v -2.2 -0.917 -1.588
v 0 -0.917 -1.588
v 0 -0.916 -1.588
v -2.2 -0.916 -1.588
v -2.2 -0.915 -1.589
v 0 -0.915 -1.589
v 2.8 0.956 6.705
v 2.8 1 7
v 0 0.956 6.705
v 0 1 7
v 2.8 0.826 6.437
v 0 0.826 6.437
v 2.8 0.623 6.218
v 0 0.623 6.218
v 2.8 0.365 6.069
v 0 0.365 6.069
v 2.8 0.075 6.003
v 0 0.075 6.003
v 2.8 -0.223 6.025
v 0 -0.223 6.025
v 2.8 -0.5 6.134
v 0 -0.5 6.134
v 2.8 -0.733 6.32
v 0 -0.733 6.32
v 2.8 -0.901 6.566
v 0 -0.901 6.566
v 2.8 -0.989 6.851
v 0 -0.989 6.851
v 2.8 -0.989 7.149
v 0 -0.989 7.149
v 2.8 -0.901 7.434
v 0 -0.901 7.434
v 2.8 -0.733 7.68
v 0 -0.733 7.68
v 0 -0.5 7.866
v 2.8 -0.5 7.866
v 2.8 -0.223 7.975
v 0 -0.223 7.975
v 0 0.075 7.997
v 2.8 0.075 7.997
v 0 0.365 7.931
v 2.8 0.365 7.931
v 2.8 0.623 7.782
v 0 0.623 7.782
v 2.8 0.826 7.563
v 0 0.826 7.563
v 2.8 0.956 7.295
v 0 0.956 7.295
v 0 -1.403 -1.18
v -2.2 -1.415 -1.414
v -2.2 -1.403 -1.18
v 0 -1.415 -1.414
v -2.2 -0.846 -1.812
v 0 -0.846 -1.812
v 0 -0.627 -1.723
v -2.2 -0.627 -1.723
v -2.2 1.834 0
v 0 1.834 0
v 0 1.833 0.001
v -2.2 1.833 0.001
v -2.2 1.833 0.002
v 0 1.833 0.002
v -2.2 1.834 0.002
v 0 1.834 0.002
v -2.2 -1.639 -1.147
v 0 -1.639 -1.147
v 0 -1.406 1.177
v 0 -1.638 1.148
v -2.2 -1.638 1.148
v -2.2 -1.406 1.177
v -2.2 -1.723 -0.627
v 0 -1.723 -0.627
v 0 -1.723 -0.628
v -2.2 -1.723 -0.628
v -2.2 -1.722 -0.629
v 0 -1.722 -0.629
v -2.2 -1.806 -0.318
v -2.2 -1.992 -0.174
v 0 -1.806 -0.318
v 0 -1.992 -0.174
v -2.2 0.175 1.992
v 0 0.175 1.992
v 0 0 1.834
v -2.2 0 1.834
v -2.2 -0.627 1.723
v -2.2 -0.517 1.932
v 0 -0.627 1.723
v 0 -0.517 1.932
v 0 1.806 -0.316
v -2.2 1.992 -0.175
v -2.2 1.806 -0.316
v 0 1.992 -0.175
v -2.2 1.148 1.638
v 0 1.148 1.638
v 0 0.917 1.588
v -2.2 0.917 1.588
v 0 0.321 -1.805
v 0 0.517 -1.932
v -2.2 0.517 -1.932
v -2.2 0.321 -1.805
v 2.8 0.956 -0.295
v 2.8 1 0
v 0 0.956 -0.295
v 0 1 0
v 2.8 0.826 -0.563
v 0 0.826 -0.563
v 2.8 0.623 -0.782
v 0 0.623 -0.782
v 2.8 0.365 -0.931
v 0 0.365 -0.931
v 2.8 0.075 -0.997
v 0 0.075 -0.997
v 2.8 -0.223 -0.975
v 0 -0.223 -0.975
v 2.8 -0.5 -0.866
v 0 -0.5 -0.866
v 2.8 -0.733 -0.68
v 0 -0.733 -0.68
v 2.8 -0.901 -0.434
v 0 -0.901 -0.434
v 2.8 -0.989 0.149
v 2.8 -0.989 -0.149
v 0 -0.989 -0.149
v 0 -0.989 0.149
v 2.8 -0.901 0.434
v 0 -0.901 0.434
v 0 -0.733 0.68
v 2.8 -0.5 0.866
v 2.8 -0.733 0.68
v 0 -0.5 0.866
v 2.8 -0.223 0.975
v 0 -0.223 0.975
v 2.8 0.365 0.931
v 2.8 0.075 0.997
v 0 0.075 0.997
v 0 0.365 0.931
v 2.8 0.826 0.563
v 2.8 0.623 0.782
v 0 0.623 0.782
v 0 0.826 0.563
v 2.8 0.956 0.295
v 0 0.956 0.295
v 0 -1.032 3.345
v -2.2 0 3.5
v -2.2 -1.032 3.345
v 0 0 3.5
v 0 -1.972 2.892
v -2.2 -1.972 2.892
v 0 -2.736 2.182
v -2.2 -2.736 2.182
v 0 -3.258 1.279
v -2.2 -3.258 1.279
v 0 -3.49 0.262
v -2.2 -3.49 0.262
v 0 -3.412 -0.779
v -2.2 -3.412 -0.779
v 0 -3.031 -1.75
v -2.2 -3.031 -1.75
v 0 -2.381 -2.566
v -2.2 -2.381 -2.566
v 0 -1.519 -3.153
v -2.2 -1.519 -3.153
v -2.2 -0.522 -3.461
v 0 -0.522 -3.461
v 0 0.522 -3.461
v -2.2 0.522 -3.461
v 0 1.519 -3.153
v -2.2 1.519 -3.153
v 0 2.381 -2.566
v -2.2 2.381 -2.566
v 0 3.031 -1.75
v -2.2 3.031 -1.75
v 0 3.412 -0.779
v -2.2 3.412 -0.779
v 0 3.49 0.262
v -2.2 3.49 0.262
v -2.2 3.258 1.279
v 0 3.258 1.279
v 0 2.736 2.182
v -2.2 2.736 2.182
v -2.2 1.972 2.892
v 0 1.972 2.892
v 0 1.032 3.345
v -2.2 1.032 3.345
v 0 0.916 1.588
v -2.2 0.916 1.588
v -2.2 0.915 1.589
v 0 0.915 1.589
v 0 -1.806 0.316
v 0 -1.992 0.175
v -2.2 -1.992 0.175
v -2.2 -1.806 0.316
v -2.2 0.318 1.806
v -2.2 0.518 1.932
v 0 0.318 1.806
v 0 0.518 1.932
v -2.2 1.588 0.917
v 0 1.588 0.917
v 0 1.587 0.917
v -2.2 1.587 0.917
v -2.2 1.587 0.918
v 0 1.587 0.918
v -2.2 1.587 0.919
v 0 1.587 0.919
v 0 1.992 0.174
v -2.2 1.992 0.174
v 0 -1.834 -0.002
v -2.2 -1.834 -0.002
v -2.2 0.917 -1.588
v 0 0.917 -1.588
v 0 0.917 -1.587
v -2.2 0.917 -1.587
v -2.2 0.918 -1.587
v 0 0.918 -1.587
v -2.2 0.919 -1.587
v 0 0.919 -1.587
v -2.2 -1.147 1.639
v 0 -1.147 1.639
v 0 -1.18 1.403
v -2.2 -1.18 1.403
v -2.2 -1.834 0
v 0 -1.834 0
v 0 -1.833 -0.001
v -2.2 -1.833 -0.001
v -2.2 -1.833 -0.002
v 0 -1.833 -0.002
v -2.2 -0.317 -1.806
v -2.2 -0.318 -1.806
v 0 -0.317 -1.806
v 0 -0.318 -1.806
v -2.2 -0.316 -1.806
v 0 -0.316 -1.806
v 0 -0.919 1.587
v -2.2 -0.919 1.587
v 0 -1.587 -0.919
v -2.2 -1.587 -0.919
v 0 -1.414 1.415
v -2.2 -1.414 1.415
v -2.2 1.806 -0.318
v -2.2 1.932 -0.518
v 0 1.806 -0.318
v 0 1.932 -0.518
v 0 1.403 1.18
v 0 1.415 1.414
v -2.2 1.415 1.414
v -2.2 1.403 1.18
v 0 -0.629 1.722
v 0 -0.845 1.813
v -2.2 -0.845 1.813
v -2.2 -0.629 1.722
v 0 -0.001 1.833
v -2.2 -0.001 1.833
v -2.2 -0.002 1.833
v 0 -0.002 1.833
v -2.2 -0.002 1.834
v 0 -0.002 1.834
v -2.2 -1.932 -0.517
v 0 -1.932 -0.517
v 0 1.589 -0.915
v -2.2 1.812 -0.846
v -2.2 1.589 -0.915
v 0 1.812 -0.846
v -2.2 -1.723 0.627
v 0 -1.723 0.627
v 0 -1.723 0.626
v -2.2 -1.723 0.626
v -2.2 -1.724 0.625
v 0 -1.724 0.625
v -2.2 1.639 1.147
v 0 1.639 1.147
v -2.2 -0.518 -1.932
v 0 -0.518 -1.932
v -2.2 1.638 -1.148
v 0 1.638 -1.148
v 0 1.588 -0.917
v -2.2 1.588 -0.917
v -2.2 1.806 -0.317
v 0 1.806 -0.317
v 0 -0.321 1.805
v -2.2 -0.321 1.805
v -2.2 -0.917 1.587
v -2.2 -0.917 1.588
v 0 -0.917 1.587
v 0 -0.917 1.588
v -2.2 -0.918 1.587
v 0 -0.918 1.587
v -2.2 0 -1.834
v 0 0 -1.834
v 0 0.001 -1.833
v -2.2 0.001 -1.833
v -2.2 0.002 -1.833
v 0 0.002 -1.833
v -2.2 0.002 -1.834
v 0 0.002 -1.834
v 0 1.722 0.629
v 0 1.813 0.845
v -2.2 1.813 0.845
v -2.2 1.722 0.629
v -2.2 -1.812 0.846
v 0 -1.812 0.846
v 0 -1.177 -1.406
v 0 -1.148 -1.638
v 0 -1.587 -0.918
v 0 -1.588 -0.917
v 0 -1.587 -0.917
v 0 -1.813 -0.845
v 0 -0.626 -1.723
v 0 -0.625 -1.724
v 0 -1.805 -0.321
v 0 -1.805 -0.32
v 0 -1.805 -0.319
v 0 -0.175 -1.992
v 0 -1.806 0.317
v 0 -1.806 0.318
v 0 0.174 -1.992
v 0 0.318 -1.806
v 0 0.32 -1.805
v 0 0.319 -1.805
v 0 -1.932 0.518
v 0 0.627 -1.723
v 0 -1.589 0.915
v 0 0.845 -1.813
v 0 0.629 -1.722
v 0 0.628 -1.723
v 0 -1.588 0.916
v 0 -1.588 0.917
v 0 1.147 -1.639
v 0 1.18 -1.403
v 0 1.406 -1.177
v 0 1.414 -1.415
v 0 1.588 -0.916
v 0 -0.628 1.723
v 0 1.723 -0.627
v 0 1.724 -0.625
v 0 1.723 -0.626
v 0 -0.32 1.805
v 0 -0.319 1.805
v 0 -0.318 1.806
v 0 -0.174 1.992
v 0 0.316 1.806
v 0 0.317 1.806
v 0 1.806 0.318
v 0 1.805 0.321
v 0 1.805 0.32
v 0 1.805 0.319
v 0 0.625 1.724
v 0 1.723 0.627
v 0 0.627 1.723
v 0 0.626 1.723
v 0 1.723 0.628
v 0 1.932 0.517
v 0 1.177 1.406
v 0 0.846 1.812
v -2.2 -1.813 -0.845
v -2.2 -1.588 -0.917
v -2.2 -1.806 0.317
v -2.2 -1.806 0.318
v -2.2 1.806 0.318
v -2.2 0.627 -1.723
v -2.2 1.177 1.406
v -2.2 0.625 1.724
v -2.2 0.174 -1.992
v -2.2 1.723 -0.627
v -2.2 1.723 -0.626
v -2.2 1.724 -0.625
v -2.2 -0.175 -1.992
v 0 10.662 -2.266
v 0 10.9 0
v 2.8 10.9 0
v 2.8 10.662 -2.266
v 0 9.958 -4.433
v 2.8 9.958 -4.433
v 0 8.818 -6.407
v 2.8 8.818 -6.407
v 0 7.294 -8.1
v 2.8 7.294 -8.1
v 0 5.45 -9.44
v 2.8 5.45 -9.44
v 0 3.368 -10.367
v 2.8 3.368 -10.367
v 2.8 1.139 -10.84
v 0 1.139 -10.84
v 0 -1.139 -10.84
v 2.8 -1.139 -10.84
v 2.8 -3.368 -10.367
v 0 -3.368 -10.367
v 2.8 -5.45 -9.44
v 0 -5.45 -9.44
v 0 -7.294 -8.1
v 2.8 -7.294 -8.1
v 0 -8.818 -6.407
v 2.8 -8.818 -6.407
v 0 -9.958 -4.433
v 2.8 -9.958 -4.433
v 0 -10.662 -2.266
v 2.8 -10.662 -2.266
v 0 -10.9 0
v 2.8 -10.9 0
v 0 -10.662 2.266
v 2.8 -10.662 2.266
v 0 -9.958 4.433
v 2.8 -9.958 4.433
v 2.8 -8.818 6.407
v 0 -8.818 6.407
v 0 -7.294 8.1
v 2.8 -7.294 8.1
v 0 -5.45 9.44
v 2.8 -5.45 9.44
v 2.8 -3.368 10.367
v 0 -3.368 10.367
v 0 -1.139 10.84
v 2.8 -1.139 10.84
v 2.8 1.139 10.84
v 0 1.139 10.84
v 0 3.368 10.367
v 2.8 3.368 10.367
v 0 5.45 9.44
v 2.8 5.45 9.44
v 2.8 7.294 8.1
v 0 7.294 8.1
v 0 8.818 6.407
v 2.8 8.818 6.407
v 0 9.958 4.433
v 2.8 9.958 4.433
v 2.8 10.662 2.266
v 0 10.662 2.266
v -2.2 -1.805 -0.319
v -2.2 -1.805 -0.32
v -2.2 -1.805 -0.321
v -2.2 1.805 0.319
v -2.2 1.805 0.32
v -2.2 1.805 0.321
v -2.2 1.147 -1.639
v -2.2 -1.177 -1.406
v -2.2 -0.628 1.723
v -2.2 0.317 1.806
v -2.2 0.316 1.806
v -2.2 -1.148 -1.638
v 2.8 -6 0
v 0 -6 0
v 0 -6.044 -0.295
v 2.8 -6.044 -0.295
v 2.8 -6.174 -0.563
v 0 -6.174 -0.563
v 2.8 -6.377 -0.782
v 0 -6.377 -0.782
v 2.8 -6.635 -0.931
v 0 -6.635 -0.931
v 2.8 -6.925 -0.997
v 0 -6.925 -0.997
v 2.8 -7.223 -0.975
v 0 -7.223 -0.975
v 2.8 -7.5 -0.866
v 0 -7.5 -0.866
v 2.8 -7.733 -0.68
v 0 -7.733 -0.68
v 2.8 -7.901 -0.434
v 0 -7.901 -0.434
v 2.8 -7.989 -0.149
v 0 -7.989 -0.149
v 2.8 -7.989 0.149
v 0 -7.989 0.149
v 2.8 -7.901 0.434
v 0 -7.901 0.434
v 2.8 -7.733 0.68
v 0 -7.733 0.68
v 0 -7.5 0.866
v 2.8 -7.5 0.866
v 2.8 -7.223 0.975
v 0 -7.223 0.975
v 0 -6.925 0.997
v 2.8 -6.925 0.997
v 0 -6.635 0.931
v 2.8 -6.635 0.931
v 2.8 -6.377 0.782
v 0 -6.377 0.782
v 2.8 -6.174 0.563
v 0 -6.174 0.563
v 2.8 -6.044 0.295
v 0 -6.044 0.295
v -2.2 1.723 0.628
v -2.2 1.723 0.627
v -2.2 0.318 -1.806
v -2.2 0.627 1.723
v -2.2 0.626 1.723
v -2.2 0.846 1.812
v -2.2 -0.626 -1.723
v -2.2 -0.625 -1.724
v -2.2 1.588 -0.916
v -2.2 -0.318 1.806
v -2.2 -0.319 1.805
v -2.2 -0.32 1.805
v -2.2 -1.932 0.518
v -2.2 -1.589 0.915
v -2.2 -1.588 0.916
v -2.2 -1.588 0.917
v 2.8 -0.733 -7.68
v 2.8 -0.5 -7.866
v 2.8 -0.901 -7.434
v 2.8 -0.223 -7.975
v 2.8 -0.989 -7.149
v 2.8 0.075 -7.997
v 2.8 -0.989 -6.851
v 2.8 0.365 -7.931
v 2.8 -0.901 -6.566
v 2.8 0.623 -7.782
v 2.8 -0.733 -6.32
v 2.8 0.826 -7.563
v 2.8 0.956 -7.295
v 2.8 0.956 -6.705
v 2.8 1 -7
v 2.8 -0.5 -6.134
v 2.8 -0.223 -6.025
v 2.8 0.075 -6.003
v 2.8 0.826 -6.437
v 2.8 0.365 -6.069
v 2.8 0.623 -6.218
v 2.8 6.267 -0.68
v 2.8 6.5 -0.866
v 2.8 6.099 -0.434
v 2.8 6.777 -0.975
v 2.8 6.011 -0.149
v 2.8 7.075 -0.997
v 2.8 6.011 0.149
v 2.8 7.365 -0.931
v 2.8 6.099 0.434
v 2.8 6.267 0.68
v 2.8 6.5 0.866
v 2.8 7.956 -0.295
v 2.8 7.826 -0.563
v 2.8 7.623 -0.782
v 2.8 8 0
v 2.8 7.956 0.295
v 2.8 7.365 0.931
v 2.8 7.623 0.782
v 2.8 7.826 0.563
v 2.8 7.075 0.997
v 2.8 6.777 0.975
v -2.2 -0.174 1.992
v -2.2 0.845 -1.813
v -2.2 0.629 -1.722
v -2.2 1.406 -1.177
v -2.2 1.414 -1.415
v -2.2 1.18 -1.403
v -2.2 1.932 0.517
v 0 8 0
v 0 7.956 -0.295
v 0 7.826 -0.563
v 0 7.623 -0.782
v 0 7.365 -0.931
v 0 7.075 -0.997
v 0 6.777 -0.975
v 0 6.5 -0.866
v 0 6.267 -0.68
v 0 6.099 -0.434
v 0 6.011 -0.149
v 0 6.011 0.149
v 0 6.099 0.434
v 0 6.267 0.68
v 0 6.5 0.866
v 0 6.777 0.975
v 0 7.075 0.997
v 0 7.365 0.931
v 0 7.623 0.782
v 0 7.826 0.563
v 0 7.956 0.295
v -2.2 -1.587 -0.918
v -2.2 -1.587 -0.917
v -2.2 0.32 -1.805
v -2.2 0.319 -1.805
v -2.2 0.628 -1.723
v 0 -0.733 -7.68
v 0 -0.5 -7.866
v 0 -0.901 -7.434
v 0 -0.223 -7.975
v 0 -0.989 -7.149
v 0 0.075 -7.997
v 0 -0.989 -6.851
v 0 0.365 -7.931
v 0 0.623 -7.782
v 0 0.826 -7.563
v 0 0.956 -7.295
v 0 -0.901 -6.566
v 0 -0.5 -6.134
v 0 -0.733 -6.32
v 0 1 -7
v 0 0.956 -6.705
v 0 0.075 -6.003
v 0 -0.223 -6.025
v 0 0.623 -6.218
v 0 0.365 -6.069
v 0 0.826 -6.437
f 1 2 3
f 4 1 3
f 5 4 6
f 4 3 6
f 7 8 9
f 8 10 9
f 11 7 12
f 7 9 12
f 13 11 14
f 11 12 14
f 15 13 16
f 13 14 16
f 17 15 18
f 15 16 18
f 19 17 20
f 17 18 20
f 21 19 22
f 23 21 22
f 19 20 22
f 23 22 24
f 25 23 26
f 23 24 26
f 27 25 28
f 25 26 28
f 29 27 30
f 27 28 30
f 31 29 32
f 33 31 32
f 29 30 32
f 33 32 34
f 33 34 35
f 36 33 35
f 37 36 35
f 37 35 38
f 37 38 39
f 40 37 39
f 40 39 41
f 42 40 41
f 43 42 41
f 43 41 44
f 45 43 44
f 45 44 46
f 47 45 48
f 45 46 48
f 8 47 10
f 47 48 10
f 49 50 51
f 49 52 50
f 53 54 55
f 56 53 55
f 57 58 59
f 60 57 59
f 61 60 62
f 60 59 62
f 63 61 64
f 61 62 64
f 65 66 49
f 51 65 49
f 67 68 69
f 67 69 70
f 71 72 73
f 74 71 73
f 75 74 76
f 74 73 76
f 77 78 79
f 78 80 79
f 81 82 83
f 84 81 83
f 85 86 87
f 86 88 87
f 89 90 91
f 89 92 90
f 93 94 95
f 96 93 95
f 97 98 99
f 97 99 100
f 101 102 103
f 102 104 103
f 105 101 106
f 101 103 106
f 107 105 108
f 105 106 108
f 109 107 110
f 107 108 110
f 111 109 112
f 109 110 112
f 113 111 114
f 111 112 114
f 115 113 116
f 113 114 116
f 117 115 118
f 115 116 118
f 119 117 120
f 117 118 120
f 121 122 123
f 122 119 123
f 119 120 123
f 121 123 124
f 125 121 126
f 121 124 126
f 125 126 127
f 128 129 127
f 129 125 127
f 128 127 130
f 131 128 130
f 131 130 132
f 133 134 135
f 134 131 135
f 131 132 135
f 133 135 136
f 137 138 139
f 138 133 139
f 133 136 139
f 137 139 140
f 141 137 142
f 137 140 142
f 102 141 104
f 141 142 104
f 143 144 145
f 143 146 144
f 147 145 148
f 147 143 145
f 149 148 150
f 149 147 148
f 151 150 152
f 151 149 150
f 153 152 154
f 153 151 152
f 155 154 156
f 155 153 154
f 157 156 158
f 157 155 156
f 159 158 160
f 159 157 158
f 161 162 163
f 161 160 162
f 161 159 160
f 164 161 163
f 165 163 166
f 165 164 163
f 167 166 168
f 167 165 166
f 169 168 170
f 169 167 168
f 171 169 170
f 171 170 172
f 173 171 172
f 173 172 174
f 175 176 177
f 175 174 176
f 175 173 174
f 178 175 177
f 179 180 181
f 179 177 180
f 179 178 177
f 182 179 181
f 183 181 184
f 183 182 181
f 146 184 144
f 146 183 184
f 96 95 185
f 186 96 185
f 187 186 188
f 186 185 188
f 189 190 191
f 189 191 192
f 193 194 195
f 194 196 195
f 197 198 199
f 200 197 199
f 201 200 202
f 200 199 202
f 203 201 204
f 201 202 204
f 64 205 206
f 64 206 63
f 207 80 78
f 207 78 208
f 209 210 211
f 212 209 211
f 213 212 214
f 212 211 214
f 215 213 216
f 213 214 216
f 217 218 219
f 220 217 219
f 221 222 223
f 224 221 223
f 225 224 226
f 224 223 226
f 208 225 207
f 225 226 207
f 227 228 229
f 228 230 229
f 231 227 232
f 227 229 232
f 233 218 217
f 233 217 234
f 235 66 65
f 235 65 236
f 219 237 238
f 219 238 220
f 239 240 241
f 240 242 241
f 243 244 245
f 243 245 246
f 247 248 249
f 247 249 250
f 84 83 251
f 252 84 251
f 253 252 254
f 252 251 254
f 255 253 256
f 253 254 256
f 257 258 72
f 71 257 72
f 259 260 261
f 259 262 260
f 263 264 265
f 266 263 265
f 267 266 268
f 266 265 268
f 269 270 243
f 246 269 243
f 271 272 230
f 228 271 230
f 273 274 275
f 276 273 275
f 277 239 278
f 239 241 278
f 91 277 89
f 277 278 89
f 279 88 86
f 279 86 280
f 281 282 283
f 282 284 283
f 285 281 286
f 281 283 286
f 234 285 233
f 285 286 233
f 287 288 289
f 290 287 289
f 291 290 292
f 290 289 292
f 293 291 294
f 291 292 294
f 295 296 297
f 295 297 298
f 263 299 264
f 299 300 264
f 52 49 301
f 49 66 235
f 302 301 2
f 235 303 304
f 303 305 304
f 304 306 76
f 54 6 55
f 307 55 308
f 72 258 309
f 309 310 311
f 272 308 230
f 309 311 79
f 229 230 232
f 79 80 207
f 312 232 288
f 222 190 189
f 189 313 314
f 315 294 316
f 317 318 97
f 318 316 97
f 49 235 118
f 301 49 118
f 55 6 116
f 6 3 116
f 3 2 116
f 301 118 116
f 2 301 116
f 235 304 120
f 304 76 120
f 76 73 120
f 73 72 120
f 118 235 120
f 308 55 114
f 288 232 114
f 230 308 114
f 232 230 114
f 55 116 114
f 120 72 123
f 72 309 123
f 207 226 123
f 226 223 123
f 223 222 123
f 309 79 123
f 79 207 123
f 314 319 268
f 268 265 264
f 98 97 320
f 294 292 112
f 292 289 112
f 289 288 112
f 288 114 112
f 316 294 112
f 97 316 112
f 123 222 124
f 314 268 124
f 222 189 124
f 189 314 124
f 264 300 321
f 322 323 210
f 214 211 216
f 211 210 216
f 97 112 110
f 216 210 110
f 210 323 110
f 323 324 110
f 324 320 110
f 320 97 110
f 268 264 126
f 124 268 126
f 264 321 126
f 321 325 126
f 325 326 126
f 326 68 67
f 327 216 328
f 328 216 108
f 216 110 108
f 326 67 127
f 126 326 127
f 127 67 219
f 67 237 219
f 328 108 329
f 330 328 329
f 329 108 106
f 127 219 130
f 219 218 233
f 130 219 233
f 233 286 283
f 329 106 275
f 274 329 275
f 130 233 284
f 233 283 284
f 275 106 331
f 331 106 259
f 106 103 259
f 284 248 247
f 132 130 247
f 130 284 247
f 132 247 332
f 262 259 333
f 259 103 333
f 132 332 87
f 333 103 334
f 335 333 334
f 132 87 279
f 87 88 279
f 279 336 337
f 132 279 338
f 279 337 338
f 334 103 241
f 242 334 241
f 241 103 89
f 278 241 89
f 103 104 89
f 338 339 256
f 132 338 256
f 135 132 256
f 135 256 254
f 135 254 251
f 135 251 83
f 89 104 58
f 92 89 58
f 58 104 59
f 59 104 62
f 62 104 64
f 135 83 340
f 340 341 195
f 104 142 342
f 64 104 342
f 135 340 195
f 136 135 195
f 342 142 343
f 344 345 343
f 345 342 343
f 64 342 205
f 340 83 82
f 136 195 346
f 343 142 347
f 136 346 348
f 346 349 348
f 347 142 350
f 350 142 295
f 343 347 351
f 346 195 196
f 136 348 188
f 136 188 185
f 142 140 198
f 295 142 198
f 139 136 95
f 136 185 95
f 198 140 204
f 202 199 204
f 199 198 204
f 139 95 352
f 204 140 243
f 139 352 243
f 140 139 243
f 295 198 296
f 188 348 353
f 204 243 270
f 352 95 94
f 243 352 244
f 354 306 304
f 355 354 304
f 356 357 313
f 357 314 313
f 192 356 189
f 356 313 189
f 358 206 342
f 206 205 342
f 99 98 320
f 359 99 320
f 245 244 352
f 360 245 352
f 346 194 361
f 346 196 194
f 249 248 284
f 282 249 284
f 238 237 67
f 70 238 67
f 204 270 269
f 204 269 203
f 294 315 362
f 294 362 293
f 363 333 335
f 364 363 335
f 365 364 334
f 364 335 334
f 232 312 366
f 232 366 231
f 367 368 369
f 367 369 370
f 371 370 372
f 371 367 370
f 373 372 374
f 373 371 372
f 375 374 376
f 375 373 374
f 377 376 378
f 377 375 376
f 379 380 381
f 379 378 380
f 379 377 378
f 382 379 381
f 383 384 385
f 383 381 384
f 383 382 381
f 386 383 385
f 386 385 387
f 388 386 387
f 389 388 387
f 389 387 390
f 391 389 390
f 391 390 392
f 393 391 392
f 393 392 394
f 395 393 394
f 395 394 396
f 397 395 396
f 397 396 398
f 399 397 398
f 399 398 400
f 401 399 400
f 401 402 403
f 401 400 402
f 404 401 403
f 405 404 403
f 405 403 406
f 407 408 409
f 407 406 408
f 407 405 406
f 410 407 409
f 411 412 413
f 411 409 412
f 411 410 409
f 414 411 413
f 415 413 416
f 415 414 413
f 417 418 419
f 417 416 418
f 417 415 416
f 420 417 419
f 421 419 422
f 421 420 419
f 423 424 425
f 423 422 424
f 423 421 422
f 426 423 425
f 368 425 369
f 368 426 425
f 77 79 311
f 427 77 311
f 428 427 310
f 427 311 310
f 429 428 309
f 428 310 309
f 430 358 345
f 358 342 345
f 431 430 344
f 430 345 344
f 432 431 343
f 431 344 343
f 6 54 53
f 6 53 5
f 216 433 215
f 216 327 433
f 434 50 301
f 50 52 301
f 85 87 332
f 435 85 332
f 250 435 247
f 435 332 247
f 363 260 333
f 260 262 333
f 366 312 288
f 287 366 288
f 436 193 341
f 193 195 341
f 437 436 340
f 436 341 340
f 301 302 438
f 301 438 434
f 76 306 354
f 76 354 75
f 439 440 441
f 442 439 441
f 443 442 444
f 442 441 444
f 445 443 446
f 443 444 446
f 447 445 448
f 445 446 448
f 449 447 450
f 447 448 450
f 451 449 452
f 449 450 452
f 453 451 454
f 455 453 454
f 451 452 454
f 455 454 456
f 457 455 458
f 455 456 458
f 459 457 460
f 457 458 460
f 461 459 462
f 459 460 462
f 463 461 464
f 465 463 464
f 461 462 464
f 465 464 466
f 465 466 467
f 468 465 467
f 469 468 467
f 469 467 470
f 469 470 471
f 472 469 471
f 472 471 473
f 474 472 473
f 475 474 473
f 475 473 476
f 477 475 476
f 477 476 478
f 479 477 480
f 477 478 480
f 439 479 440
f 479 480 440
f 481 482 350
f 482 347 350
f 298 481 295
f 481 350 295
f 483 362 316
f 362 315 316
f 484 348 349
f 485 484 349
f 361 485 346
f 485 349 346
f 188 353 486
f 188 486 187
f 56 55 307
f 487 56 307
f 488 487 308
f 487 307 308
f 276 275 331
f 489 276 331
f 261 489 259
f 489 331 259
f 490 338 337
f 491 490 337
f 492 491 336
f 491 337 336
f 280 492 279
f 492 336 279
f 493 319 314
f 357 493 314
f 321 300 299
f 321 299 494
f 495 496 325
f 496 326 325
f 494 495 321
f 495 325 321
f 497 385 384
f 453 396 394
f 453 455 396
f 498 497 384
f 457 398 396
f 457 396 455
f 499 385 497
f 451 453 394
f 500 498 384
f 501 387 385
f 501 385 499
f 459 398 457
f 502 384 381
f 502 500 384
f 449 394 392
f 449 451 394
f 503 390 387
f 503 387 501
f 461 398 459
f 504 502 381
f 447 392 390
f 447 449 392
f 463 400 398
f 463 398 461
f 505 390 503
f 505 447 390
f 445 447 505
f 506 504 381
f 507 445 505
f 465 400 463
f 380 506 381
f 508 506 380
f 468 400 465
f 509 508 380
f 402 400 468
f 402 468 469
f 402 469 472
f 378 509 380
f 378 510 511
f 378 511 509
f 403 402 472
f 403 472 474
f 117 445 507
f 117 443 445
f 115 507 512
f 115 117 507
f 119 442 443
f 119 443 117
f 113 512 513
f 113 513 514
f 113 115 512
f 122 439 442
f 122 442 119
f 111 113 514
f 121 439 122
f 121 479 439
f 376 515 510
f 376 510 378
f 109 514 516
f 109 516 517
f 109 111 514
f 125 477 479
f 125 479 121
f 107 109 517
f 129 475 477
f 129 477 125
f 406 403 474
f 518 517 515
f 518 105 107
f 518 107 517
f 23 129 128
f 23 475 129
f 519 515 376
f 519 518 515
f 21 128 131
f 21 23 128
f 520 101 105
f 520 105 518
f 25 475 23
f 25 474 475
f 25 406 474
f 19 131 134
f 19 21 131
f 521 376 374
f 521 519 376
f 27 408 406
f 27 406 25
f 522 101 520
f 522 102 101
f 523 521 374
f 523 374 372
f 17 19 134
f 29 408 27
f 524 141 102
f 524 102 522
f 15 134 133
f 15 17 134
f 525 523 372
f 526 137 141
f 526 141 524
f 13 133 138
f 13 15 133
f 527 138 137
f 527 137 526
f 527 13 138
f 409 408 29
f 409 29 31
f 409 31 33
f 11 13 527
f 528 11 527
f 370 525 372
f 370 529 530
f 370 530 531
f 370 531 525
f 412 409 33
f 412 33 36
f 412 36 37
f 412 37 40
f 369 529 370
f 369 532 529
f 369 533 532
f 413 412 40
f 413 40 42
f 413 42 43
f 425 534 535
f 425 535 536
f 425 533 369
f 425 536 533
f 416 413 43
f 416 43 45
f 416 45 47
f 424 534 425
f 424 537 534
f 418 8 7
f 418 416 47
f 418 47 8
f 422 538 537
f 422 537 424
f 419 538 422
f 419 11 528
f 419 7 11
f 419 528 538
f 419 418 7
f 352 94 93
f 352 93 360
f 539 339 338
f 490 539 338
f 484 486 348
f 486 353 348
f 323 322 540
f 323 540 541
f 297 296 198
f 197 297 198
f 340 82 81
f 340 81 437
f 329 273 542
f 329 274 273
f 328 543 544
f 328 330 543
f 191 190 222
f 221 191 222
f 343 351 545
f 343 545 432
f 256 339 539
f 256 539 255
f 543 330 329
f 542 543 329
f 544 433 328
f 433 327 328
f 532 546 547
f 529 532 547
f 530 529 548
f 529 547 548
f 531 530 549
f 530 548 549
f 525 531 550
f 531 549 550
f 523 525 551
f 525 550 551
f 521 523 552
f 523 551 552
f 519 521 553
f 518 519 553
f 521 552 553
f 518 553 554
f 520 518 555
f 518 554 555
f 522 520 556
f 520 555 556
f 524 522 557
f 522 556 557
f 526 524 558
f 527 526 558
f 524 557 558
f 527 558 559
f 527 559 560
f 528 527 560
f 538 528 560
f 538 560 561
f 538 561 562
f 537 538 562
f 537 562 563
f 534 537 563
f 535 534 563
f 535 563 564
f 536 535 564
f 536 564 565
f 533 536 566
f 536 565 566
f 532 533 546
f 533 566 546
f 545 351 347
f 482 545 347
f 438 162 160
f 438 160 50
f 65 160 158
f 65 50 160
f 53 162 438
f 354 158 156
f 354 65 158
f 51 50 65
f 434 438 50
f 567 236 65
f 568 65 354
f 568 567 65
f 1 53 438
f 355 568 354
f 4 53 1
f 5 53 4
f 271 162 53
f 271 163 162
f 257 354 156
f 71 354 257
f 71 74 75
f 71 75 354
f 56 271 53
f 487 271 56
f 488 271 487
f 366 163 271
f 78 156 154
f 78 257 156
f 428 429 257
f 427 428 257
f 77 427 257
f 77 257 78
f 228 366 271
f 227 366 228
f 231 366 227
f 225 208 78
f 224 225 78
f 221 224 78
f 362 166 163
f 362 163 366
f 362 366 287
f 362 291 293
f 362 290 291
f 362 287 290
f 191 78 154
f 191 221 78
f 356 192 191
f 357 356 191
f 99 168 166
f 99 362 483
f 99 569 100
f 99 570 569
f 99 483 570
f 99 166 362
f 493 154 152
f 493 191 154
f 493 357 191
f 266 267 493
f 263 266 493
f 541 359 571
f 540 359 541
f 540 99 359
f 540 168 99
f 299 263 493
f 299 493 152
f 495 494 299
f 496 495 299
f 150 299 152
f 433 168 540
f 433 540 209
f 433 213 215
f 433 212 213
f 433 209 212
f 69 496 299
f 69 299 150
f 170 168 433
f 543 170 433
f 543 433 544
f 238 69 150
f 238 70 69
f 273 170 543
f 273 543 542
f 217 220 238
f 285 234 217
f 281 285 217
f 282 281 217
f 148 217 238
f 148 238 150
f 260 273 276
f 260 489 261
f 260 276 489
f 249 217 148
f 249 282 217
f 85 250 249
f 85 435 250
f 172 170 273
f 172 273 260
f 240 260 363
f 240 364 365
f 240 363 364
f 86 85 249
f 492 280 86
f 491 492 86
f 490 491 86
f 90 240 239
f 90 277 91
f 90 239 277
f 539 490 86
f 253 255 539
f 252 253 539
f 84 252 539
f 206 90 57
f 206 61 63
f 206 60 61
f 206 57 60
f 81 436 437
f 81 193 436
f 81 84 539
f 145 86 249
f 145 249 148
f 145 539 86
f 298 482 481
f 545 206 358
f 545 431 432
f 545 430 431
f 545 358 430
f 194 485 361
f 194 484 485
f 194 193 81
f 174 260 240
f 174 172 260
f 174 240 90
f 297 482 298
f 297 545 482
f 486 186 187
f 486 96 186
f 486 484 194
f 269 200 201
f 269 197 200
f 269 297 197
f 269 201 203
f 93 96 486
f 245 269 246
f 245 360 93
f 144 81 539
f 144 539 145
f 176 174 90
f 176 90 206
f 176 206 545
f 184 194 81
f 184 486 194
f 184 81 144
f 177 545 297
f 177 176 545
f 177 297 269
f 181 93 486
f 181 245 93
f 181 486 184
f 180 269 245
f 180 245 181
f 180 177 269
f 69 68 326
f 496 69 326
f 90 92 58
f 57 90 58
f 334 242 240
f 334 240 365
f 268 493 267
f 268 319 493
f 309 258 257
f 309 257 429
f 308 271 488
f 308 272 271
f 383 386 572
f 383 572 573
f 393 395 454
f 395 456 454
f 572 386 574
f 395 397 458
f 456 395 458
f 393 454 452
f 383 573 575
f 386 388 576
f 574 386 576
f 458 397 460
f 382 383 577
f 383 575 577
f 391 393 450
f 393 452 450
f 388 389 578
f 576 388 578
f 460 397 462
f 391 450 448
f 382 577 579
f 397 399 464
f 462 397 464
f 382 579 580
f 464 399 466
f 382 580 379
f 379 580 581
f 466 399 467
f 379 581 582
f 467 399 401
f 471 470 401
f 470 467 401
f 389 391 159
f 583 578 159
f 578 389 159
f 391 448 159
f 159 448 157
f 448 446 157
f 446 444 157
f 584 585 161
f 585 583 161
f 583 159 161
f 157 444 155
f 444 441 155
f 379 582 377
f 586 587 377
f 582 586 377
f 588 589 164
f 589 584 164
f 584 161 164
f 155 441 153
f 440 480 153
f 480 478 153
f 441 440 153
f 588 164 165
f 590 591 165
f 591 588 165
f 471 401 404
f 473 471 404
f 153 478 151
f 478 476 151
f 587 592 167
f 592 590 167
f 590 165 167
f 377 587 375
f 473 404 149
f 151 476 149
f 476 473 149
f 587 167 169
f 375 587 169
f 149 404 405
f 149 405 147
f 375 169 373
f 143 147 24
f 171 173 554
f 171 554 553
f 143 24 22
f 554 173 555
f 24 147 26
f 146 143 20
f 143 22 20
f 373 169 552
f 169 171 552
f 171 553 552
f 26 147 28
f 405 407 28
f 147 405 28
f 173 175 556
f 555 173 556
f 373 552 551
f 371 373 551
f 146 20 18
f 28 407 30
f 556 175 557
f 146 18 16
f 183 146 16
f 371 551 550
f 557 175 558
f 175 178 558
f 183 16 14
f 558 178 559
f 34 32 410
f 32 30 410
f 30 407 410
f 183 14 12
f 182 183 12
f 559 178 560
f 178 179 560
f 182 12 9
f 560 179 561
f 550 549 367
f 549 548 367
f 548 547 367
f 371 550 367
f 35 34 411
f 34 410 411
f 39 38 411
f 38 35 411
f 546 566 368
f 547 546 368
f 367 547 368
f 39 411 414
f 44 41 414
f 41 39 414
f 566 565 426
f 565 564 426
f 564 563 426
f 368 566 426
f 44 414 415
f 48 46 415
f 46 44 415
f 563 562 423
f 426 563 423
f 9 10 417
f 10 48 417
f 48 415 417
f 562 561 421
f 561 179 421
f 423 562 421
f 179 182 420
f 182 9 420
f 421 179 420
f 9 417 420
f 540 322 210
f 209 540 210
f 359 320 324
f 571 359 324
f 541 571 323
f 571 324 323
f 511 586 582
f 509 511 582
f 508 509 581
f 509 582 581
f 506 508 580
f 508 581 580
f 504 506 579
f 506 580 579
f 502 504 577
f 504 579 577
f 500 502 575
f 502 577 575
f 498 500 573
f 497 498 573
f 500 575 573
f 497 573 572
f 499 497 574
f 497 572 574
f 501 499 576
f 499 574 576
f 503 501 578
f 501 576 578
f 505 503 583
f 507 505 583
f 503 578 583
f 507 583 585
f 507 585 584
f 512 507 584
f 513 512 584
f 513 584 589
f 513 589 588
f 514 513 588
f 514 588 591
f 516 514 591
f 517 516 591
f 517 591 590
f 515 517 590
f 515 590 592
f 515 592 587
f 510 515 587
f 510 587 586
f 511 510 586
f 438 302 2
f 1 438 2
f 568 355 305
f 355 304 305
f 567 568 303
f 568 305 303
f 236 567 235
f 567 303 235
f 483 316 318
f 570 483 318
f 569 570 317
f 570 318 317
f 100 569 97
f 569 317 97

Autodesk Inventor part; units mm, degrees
ref_plane "YZ Plane" through (0, 0, 0) normal (1, 0, 0) x (0, 1, 0)
ref_plane "XZ Plane" through (0, 0, 0) normal (0, 1, 0) x (-1, 0, 0)
ref_plane "XY Plane" through (0, 0, 0) normal (0, 0, 1) x (1, 0, 0)
sketch "Sketch1" plane through (0, 0, 0) normal (1, 0, 0) x (0, 1, 0)
  circle A0 centre (0, 0) radius 10.9
  circle A1 centre (0, 0) radius 1
  circle A2 centre (0, 0) radius 7
  circle A3 centre (7, 0) radius 1
  circle A4 centre (0, 7) radius 1
  circle A5 centre (-7, 0) radius 1
  circle A6 centre (0, -7) radius 1
  dimension "d2" = 14
  dimension "d0" = 21.8
  dimension "d1" = 2
  dimension "d3" = 2
  dimension "d6" = 360
extrude "Extrusion1" add sketch "Sketch1" along normal blind 2.8 contours A0 | A3 A2 A6 A5 A4
sketch "Sketch2" plane through (0, 0, 0) normal (-1, 0, 0) x (0, 0, 1)
  circle A0 centre (0, 0) radius 3.5
  line L0 (-0.0024, 0.0008) -> (1.8342, 0.0008) construction
  line L1 (0, 0) -> (2, 0) construction
  circle A1 centre (0, 0) radius 1.8335
  line L2 (-0.517, -1.932) -> (-0.6271, -1.7229)
  line L3 (-0.517, -1.932) -> (-0.3208, -1.8052)
  line L4 (-0.1736, -1.9924) -> (-0.3184, -1.8056)
  line L5 (-0.1736, -1.9924) -> (-0.0025, -1.8335)
  line L6 (0.175, -1.9923) -> (0, -1.8335)
  line L7 (0.175, -1.9923) -> (0.316, -1.806)
  line L8 (0.5183, -1.9317) -> (0.3184, -1.8056)
  line L9 (0.5183, -1.9317) -> (0.6248, -1.7237)
  line L10 (0.8458, -1.8123) -> (0.6271, -1.7229)
  line L11 (0.8458, -1.8123) -> (0.9146, -1.5891)
  line L12 (1.1477, -1.6379) -> (0.9167, -1.5878)
  line L13 (1.1477, -1.6379) -> (1.1766, -1.4061)
  line L14 (1.4147, -1.4137) -> (1.1785, -1.4045)
  line L15 (1.4147, -1.4137) -> (1.4029, -1.1804)
  line L16 (1.6387, -1.1466) -> (1.4045, -1.1785)
  line L17 (1.6387, -1.1466) -> (1.5866, -0.9189)
  line L18 (1.8129, -0.8446) -> (1.5878, -0.9167)
  line L19 (1.8129, -0.8446) -> (1.7221, -0.6294)
  line L20 (1.932, -0.517) -> (1.7229, -0.6271)
  line L21 (1.932, -0.517) -> (1.8052, -0.3208)
  line L22 (1.9924, -0.1736) -> (1.8056, -0.3184)
  line L23 (1.9924, -0.1736) -> (1.8335, -0.0025)
  line L24 (1.9923, 0.175) -> (1.8335, 0)
  line L25 (1.9923, 0.175) -> (1.806, 0.316)
  line L26 (1.9317, 0.5183) -> (1.8056, 0.3184)
  line L27 (1.9317, 0.5183) -> (1.7237, 0.6248)
  line L28 (1.8123, 0.8458) -> (1.7229, 0.6271)
  line L29 (1.8123, 0.8458) -> (1.5891, 0.9146)
  line L30 (1.6379, 1.1477) -> (1.5878, 0.9167)
  line L31 (1.6379, 1.1477) -> (1.4061, 1.1766)
  line L32 (1.4137, 1.4147) -> (1.4045, 1.1785)
  line L33 (1.4137, 1.4147) -> (1.1804, 1.4029)
  line L34 (1.1466, 1.6387) -> (1.1785, 1.4045)
  line L35 (1.1466, 1.6387) -> (0.9189, 1.5866)
  line L36 (0.8446, 1.8129) -> (0.9167, 1.5878)
  line L37 (0.8446, 1.8129) -> (0.6294, 1.7221)
  line L38 (0.517, 1.932) -> (0.6271, 1.7229)
  line L39 (0.517, 1.932) -> (0.3208, 1.8052)
  line L40 (0.1736, 1.9924) -> (0.3184, 1.8056)
  line L41 (0.1736, 1.9924) -> (0.0025, 1.8335)
  line L42 (-0.175, 1.9923) -> (0, 1.8335)
  line L43 (-0.175, 1.9923) -> (-0.316, 1.806)
  line L44 (-0.5183, 1.9317) -> (-0.3184, 1.8056)
  line L45 (-0.5183, 1.9317) -> (-0.6248, 1.7237)
  line L46 (-0.8458, 1.8123) -> (-0.6271, 1.7229)
  line L47 (-0.8458, 1.8123) -> (-0.9146, 1.5891)
  line L48 (-1.1477, 1.6379) -> (-0.9167, 1.5878)
  line L49 (-1.1477, 1.6379) -> (-1.1766, 1.4061)
  line L50 (-1.4147, 1.4137) -> (-1.1785, 1.4045)
  line L51 (-1.4147, 1.4137) -> (-1.4029, 1.1804)
  line L52 (-1.6387, 1.1466) -> (-1.4045, 1.1785)
  line L53 (-1.6387, 1.1466) -> (-1.5866, 0.9189)
  line L54 (-1.8129, 0.8446) -> (-1.5878, 0.9167)
  line L55 (-1.8129, 0.8446) -> (-1.7221, 0.6294)
  line L56 (-1.932, 0.517) -> (-1.7229, 0.6271)
  line L57 (-1.932, 0.517) -> (-1.8052, 0.3208)
  line L58 (-1.9924, 0.1736) -> (-1.8056, 0.3184)
  line L59 (-1.9924, 0.1736) -> (-1.8335, 0.0025)
  line L60 (-1.9923, -0.175) -> (-1.8335, 0)
  line L61 (-1.9923, -0.175) -> (-1.806, -0.316)
  line L62 (-1.9317, -0.5183) -> (-1.8056, -0.3184)
  line L63 (-1.9317, -0.5183) -> (-1.7237, -0.6248)
  line L64 (-1.8123, -0.8458) -> (-1.7229, -0.6271)
  line L65 (-1.8123, -0.8458) -> (-1.5891, -0.9146)
  line L66 (-1.6379, -1.1477) -> (-1.5878, -0.9167)
  line L67 (-1.6379, -1.1477) -> (-1.4061, -1.1766)
  line L68 (-1.4137, -1.4147) -> (-1.4045, -1.1785)
  line L69 (-1.4137, -1.4147) -> (-1.1804, -1.4029)
  line L70 (-1.1466, -1.6387) -> (-1.1785, -1.4045)
  line L71 (-1.1466, -1.6387) -> (-0.9189, -1.5866)
  line L72 (-0.8446, -1.8129) -> (-0.9167, -1.5878)
  line L73 (-0.8446, -1.8129) -> (-0.6294, -1.7221)
  arc A2 (2, 0) -> (1.9998, 0.0261) centre (0, 0) ccw
  point P0 (1.8335, 0)
  dimension "d10" = 7
  dimension "d13" = 360
extrude "Extrusion2" add sketch "Sketch2" along normal blind 2.2
thread "Thread1" size "M2x0.4" class "6H" standard "ANSI Metric M Profile" length 5
thread "Thread2" size "M2x0.4" class "6H" standard "ANSI Metric M Profile" length 5
thread "Thread3" size "M2x0.4" class "6H" standard "ANSI Metric M Profile" length 5
thread "Thread4" size "M2x0.4" class "6H" standard "ANSI Metric M Profile" length 5
thread "Thread5" size "M2x0.4" class "6H" standard "ANSI Metric M Profile" length 5
properties part number "Part R"
